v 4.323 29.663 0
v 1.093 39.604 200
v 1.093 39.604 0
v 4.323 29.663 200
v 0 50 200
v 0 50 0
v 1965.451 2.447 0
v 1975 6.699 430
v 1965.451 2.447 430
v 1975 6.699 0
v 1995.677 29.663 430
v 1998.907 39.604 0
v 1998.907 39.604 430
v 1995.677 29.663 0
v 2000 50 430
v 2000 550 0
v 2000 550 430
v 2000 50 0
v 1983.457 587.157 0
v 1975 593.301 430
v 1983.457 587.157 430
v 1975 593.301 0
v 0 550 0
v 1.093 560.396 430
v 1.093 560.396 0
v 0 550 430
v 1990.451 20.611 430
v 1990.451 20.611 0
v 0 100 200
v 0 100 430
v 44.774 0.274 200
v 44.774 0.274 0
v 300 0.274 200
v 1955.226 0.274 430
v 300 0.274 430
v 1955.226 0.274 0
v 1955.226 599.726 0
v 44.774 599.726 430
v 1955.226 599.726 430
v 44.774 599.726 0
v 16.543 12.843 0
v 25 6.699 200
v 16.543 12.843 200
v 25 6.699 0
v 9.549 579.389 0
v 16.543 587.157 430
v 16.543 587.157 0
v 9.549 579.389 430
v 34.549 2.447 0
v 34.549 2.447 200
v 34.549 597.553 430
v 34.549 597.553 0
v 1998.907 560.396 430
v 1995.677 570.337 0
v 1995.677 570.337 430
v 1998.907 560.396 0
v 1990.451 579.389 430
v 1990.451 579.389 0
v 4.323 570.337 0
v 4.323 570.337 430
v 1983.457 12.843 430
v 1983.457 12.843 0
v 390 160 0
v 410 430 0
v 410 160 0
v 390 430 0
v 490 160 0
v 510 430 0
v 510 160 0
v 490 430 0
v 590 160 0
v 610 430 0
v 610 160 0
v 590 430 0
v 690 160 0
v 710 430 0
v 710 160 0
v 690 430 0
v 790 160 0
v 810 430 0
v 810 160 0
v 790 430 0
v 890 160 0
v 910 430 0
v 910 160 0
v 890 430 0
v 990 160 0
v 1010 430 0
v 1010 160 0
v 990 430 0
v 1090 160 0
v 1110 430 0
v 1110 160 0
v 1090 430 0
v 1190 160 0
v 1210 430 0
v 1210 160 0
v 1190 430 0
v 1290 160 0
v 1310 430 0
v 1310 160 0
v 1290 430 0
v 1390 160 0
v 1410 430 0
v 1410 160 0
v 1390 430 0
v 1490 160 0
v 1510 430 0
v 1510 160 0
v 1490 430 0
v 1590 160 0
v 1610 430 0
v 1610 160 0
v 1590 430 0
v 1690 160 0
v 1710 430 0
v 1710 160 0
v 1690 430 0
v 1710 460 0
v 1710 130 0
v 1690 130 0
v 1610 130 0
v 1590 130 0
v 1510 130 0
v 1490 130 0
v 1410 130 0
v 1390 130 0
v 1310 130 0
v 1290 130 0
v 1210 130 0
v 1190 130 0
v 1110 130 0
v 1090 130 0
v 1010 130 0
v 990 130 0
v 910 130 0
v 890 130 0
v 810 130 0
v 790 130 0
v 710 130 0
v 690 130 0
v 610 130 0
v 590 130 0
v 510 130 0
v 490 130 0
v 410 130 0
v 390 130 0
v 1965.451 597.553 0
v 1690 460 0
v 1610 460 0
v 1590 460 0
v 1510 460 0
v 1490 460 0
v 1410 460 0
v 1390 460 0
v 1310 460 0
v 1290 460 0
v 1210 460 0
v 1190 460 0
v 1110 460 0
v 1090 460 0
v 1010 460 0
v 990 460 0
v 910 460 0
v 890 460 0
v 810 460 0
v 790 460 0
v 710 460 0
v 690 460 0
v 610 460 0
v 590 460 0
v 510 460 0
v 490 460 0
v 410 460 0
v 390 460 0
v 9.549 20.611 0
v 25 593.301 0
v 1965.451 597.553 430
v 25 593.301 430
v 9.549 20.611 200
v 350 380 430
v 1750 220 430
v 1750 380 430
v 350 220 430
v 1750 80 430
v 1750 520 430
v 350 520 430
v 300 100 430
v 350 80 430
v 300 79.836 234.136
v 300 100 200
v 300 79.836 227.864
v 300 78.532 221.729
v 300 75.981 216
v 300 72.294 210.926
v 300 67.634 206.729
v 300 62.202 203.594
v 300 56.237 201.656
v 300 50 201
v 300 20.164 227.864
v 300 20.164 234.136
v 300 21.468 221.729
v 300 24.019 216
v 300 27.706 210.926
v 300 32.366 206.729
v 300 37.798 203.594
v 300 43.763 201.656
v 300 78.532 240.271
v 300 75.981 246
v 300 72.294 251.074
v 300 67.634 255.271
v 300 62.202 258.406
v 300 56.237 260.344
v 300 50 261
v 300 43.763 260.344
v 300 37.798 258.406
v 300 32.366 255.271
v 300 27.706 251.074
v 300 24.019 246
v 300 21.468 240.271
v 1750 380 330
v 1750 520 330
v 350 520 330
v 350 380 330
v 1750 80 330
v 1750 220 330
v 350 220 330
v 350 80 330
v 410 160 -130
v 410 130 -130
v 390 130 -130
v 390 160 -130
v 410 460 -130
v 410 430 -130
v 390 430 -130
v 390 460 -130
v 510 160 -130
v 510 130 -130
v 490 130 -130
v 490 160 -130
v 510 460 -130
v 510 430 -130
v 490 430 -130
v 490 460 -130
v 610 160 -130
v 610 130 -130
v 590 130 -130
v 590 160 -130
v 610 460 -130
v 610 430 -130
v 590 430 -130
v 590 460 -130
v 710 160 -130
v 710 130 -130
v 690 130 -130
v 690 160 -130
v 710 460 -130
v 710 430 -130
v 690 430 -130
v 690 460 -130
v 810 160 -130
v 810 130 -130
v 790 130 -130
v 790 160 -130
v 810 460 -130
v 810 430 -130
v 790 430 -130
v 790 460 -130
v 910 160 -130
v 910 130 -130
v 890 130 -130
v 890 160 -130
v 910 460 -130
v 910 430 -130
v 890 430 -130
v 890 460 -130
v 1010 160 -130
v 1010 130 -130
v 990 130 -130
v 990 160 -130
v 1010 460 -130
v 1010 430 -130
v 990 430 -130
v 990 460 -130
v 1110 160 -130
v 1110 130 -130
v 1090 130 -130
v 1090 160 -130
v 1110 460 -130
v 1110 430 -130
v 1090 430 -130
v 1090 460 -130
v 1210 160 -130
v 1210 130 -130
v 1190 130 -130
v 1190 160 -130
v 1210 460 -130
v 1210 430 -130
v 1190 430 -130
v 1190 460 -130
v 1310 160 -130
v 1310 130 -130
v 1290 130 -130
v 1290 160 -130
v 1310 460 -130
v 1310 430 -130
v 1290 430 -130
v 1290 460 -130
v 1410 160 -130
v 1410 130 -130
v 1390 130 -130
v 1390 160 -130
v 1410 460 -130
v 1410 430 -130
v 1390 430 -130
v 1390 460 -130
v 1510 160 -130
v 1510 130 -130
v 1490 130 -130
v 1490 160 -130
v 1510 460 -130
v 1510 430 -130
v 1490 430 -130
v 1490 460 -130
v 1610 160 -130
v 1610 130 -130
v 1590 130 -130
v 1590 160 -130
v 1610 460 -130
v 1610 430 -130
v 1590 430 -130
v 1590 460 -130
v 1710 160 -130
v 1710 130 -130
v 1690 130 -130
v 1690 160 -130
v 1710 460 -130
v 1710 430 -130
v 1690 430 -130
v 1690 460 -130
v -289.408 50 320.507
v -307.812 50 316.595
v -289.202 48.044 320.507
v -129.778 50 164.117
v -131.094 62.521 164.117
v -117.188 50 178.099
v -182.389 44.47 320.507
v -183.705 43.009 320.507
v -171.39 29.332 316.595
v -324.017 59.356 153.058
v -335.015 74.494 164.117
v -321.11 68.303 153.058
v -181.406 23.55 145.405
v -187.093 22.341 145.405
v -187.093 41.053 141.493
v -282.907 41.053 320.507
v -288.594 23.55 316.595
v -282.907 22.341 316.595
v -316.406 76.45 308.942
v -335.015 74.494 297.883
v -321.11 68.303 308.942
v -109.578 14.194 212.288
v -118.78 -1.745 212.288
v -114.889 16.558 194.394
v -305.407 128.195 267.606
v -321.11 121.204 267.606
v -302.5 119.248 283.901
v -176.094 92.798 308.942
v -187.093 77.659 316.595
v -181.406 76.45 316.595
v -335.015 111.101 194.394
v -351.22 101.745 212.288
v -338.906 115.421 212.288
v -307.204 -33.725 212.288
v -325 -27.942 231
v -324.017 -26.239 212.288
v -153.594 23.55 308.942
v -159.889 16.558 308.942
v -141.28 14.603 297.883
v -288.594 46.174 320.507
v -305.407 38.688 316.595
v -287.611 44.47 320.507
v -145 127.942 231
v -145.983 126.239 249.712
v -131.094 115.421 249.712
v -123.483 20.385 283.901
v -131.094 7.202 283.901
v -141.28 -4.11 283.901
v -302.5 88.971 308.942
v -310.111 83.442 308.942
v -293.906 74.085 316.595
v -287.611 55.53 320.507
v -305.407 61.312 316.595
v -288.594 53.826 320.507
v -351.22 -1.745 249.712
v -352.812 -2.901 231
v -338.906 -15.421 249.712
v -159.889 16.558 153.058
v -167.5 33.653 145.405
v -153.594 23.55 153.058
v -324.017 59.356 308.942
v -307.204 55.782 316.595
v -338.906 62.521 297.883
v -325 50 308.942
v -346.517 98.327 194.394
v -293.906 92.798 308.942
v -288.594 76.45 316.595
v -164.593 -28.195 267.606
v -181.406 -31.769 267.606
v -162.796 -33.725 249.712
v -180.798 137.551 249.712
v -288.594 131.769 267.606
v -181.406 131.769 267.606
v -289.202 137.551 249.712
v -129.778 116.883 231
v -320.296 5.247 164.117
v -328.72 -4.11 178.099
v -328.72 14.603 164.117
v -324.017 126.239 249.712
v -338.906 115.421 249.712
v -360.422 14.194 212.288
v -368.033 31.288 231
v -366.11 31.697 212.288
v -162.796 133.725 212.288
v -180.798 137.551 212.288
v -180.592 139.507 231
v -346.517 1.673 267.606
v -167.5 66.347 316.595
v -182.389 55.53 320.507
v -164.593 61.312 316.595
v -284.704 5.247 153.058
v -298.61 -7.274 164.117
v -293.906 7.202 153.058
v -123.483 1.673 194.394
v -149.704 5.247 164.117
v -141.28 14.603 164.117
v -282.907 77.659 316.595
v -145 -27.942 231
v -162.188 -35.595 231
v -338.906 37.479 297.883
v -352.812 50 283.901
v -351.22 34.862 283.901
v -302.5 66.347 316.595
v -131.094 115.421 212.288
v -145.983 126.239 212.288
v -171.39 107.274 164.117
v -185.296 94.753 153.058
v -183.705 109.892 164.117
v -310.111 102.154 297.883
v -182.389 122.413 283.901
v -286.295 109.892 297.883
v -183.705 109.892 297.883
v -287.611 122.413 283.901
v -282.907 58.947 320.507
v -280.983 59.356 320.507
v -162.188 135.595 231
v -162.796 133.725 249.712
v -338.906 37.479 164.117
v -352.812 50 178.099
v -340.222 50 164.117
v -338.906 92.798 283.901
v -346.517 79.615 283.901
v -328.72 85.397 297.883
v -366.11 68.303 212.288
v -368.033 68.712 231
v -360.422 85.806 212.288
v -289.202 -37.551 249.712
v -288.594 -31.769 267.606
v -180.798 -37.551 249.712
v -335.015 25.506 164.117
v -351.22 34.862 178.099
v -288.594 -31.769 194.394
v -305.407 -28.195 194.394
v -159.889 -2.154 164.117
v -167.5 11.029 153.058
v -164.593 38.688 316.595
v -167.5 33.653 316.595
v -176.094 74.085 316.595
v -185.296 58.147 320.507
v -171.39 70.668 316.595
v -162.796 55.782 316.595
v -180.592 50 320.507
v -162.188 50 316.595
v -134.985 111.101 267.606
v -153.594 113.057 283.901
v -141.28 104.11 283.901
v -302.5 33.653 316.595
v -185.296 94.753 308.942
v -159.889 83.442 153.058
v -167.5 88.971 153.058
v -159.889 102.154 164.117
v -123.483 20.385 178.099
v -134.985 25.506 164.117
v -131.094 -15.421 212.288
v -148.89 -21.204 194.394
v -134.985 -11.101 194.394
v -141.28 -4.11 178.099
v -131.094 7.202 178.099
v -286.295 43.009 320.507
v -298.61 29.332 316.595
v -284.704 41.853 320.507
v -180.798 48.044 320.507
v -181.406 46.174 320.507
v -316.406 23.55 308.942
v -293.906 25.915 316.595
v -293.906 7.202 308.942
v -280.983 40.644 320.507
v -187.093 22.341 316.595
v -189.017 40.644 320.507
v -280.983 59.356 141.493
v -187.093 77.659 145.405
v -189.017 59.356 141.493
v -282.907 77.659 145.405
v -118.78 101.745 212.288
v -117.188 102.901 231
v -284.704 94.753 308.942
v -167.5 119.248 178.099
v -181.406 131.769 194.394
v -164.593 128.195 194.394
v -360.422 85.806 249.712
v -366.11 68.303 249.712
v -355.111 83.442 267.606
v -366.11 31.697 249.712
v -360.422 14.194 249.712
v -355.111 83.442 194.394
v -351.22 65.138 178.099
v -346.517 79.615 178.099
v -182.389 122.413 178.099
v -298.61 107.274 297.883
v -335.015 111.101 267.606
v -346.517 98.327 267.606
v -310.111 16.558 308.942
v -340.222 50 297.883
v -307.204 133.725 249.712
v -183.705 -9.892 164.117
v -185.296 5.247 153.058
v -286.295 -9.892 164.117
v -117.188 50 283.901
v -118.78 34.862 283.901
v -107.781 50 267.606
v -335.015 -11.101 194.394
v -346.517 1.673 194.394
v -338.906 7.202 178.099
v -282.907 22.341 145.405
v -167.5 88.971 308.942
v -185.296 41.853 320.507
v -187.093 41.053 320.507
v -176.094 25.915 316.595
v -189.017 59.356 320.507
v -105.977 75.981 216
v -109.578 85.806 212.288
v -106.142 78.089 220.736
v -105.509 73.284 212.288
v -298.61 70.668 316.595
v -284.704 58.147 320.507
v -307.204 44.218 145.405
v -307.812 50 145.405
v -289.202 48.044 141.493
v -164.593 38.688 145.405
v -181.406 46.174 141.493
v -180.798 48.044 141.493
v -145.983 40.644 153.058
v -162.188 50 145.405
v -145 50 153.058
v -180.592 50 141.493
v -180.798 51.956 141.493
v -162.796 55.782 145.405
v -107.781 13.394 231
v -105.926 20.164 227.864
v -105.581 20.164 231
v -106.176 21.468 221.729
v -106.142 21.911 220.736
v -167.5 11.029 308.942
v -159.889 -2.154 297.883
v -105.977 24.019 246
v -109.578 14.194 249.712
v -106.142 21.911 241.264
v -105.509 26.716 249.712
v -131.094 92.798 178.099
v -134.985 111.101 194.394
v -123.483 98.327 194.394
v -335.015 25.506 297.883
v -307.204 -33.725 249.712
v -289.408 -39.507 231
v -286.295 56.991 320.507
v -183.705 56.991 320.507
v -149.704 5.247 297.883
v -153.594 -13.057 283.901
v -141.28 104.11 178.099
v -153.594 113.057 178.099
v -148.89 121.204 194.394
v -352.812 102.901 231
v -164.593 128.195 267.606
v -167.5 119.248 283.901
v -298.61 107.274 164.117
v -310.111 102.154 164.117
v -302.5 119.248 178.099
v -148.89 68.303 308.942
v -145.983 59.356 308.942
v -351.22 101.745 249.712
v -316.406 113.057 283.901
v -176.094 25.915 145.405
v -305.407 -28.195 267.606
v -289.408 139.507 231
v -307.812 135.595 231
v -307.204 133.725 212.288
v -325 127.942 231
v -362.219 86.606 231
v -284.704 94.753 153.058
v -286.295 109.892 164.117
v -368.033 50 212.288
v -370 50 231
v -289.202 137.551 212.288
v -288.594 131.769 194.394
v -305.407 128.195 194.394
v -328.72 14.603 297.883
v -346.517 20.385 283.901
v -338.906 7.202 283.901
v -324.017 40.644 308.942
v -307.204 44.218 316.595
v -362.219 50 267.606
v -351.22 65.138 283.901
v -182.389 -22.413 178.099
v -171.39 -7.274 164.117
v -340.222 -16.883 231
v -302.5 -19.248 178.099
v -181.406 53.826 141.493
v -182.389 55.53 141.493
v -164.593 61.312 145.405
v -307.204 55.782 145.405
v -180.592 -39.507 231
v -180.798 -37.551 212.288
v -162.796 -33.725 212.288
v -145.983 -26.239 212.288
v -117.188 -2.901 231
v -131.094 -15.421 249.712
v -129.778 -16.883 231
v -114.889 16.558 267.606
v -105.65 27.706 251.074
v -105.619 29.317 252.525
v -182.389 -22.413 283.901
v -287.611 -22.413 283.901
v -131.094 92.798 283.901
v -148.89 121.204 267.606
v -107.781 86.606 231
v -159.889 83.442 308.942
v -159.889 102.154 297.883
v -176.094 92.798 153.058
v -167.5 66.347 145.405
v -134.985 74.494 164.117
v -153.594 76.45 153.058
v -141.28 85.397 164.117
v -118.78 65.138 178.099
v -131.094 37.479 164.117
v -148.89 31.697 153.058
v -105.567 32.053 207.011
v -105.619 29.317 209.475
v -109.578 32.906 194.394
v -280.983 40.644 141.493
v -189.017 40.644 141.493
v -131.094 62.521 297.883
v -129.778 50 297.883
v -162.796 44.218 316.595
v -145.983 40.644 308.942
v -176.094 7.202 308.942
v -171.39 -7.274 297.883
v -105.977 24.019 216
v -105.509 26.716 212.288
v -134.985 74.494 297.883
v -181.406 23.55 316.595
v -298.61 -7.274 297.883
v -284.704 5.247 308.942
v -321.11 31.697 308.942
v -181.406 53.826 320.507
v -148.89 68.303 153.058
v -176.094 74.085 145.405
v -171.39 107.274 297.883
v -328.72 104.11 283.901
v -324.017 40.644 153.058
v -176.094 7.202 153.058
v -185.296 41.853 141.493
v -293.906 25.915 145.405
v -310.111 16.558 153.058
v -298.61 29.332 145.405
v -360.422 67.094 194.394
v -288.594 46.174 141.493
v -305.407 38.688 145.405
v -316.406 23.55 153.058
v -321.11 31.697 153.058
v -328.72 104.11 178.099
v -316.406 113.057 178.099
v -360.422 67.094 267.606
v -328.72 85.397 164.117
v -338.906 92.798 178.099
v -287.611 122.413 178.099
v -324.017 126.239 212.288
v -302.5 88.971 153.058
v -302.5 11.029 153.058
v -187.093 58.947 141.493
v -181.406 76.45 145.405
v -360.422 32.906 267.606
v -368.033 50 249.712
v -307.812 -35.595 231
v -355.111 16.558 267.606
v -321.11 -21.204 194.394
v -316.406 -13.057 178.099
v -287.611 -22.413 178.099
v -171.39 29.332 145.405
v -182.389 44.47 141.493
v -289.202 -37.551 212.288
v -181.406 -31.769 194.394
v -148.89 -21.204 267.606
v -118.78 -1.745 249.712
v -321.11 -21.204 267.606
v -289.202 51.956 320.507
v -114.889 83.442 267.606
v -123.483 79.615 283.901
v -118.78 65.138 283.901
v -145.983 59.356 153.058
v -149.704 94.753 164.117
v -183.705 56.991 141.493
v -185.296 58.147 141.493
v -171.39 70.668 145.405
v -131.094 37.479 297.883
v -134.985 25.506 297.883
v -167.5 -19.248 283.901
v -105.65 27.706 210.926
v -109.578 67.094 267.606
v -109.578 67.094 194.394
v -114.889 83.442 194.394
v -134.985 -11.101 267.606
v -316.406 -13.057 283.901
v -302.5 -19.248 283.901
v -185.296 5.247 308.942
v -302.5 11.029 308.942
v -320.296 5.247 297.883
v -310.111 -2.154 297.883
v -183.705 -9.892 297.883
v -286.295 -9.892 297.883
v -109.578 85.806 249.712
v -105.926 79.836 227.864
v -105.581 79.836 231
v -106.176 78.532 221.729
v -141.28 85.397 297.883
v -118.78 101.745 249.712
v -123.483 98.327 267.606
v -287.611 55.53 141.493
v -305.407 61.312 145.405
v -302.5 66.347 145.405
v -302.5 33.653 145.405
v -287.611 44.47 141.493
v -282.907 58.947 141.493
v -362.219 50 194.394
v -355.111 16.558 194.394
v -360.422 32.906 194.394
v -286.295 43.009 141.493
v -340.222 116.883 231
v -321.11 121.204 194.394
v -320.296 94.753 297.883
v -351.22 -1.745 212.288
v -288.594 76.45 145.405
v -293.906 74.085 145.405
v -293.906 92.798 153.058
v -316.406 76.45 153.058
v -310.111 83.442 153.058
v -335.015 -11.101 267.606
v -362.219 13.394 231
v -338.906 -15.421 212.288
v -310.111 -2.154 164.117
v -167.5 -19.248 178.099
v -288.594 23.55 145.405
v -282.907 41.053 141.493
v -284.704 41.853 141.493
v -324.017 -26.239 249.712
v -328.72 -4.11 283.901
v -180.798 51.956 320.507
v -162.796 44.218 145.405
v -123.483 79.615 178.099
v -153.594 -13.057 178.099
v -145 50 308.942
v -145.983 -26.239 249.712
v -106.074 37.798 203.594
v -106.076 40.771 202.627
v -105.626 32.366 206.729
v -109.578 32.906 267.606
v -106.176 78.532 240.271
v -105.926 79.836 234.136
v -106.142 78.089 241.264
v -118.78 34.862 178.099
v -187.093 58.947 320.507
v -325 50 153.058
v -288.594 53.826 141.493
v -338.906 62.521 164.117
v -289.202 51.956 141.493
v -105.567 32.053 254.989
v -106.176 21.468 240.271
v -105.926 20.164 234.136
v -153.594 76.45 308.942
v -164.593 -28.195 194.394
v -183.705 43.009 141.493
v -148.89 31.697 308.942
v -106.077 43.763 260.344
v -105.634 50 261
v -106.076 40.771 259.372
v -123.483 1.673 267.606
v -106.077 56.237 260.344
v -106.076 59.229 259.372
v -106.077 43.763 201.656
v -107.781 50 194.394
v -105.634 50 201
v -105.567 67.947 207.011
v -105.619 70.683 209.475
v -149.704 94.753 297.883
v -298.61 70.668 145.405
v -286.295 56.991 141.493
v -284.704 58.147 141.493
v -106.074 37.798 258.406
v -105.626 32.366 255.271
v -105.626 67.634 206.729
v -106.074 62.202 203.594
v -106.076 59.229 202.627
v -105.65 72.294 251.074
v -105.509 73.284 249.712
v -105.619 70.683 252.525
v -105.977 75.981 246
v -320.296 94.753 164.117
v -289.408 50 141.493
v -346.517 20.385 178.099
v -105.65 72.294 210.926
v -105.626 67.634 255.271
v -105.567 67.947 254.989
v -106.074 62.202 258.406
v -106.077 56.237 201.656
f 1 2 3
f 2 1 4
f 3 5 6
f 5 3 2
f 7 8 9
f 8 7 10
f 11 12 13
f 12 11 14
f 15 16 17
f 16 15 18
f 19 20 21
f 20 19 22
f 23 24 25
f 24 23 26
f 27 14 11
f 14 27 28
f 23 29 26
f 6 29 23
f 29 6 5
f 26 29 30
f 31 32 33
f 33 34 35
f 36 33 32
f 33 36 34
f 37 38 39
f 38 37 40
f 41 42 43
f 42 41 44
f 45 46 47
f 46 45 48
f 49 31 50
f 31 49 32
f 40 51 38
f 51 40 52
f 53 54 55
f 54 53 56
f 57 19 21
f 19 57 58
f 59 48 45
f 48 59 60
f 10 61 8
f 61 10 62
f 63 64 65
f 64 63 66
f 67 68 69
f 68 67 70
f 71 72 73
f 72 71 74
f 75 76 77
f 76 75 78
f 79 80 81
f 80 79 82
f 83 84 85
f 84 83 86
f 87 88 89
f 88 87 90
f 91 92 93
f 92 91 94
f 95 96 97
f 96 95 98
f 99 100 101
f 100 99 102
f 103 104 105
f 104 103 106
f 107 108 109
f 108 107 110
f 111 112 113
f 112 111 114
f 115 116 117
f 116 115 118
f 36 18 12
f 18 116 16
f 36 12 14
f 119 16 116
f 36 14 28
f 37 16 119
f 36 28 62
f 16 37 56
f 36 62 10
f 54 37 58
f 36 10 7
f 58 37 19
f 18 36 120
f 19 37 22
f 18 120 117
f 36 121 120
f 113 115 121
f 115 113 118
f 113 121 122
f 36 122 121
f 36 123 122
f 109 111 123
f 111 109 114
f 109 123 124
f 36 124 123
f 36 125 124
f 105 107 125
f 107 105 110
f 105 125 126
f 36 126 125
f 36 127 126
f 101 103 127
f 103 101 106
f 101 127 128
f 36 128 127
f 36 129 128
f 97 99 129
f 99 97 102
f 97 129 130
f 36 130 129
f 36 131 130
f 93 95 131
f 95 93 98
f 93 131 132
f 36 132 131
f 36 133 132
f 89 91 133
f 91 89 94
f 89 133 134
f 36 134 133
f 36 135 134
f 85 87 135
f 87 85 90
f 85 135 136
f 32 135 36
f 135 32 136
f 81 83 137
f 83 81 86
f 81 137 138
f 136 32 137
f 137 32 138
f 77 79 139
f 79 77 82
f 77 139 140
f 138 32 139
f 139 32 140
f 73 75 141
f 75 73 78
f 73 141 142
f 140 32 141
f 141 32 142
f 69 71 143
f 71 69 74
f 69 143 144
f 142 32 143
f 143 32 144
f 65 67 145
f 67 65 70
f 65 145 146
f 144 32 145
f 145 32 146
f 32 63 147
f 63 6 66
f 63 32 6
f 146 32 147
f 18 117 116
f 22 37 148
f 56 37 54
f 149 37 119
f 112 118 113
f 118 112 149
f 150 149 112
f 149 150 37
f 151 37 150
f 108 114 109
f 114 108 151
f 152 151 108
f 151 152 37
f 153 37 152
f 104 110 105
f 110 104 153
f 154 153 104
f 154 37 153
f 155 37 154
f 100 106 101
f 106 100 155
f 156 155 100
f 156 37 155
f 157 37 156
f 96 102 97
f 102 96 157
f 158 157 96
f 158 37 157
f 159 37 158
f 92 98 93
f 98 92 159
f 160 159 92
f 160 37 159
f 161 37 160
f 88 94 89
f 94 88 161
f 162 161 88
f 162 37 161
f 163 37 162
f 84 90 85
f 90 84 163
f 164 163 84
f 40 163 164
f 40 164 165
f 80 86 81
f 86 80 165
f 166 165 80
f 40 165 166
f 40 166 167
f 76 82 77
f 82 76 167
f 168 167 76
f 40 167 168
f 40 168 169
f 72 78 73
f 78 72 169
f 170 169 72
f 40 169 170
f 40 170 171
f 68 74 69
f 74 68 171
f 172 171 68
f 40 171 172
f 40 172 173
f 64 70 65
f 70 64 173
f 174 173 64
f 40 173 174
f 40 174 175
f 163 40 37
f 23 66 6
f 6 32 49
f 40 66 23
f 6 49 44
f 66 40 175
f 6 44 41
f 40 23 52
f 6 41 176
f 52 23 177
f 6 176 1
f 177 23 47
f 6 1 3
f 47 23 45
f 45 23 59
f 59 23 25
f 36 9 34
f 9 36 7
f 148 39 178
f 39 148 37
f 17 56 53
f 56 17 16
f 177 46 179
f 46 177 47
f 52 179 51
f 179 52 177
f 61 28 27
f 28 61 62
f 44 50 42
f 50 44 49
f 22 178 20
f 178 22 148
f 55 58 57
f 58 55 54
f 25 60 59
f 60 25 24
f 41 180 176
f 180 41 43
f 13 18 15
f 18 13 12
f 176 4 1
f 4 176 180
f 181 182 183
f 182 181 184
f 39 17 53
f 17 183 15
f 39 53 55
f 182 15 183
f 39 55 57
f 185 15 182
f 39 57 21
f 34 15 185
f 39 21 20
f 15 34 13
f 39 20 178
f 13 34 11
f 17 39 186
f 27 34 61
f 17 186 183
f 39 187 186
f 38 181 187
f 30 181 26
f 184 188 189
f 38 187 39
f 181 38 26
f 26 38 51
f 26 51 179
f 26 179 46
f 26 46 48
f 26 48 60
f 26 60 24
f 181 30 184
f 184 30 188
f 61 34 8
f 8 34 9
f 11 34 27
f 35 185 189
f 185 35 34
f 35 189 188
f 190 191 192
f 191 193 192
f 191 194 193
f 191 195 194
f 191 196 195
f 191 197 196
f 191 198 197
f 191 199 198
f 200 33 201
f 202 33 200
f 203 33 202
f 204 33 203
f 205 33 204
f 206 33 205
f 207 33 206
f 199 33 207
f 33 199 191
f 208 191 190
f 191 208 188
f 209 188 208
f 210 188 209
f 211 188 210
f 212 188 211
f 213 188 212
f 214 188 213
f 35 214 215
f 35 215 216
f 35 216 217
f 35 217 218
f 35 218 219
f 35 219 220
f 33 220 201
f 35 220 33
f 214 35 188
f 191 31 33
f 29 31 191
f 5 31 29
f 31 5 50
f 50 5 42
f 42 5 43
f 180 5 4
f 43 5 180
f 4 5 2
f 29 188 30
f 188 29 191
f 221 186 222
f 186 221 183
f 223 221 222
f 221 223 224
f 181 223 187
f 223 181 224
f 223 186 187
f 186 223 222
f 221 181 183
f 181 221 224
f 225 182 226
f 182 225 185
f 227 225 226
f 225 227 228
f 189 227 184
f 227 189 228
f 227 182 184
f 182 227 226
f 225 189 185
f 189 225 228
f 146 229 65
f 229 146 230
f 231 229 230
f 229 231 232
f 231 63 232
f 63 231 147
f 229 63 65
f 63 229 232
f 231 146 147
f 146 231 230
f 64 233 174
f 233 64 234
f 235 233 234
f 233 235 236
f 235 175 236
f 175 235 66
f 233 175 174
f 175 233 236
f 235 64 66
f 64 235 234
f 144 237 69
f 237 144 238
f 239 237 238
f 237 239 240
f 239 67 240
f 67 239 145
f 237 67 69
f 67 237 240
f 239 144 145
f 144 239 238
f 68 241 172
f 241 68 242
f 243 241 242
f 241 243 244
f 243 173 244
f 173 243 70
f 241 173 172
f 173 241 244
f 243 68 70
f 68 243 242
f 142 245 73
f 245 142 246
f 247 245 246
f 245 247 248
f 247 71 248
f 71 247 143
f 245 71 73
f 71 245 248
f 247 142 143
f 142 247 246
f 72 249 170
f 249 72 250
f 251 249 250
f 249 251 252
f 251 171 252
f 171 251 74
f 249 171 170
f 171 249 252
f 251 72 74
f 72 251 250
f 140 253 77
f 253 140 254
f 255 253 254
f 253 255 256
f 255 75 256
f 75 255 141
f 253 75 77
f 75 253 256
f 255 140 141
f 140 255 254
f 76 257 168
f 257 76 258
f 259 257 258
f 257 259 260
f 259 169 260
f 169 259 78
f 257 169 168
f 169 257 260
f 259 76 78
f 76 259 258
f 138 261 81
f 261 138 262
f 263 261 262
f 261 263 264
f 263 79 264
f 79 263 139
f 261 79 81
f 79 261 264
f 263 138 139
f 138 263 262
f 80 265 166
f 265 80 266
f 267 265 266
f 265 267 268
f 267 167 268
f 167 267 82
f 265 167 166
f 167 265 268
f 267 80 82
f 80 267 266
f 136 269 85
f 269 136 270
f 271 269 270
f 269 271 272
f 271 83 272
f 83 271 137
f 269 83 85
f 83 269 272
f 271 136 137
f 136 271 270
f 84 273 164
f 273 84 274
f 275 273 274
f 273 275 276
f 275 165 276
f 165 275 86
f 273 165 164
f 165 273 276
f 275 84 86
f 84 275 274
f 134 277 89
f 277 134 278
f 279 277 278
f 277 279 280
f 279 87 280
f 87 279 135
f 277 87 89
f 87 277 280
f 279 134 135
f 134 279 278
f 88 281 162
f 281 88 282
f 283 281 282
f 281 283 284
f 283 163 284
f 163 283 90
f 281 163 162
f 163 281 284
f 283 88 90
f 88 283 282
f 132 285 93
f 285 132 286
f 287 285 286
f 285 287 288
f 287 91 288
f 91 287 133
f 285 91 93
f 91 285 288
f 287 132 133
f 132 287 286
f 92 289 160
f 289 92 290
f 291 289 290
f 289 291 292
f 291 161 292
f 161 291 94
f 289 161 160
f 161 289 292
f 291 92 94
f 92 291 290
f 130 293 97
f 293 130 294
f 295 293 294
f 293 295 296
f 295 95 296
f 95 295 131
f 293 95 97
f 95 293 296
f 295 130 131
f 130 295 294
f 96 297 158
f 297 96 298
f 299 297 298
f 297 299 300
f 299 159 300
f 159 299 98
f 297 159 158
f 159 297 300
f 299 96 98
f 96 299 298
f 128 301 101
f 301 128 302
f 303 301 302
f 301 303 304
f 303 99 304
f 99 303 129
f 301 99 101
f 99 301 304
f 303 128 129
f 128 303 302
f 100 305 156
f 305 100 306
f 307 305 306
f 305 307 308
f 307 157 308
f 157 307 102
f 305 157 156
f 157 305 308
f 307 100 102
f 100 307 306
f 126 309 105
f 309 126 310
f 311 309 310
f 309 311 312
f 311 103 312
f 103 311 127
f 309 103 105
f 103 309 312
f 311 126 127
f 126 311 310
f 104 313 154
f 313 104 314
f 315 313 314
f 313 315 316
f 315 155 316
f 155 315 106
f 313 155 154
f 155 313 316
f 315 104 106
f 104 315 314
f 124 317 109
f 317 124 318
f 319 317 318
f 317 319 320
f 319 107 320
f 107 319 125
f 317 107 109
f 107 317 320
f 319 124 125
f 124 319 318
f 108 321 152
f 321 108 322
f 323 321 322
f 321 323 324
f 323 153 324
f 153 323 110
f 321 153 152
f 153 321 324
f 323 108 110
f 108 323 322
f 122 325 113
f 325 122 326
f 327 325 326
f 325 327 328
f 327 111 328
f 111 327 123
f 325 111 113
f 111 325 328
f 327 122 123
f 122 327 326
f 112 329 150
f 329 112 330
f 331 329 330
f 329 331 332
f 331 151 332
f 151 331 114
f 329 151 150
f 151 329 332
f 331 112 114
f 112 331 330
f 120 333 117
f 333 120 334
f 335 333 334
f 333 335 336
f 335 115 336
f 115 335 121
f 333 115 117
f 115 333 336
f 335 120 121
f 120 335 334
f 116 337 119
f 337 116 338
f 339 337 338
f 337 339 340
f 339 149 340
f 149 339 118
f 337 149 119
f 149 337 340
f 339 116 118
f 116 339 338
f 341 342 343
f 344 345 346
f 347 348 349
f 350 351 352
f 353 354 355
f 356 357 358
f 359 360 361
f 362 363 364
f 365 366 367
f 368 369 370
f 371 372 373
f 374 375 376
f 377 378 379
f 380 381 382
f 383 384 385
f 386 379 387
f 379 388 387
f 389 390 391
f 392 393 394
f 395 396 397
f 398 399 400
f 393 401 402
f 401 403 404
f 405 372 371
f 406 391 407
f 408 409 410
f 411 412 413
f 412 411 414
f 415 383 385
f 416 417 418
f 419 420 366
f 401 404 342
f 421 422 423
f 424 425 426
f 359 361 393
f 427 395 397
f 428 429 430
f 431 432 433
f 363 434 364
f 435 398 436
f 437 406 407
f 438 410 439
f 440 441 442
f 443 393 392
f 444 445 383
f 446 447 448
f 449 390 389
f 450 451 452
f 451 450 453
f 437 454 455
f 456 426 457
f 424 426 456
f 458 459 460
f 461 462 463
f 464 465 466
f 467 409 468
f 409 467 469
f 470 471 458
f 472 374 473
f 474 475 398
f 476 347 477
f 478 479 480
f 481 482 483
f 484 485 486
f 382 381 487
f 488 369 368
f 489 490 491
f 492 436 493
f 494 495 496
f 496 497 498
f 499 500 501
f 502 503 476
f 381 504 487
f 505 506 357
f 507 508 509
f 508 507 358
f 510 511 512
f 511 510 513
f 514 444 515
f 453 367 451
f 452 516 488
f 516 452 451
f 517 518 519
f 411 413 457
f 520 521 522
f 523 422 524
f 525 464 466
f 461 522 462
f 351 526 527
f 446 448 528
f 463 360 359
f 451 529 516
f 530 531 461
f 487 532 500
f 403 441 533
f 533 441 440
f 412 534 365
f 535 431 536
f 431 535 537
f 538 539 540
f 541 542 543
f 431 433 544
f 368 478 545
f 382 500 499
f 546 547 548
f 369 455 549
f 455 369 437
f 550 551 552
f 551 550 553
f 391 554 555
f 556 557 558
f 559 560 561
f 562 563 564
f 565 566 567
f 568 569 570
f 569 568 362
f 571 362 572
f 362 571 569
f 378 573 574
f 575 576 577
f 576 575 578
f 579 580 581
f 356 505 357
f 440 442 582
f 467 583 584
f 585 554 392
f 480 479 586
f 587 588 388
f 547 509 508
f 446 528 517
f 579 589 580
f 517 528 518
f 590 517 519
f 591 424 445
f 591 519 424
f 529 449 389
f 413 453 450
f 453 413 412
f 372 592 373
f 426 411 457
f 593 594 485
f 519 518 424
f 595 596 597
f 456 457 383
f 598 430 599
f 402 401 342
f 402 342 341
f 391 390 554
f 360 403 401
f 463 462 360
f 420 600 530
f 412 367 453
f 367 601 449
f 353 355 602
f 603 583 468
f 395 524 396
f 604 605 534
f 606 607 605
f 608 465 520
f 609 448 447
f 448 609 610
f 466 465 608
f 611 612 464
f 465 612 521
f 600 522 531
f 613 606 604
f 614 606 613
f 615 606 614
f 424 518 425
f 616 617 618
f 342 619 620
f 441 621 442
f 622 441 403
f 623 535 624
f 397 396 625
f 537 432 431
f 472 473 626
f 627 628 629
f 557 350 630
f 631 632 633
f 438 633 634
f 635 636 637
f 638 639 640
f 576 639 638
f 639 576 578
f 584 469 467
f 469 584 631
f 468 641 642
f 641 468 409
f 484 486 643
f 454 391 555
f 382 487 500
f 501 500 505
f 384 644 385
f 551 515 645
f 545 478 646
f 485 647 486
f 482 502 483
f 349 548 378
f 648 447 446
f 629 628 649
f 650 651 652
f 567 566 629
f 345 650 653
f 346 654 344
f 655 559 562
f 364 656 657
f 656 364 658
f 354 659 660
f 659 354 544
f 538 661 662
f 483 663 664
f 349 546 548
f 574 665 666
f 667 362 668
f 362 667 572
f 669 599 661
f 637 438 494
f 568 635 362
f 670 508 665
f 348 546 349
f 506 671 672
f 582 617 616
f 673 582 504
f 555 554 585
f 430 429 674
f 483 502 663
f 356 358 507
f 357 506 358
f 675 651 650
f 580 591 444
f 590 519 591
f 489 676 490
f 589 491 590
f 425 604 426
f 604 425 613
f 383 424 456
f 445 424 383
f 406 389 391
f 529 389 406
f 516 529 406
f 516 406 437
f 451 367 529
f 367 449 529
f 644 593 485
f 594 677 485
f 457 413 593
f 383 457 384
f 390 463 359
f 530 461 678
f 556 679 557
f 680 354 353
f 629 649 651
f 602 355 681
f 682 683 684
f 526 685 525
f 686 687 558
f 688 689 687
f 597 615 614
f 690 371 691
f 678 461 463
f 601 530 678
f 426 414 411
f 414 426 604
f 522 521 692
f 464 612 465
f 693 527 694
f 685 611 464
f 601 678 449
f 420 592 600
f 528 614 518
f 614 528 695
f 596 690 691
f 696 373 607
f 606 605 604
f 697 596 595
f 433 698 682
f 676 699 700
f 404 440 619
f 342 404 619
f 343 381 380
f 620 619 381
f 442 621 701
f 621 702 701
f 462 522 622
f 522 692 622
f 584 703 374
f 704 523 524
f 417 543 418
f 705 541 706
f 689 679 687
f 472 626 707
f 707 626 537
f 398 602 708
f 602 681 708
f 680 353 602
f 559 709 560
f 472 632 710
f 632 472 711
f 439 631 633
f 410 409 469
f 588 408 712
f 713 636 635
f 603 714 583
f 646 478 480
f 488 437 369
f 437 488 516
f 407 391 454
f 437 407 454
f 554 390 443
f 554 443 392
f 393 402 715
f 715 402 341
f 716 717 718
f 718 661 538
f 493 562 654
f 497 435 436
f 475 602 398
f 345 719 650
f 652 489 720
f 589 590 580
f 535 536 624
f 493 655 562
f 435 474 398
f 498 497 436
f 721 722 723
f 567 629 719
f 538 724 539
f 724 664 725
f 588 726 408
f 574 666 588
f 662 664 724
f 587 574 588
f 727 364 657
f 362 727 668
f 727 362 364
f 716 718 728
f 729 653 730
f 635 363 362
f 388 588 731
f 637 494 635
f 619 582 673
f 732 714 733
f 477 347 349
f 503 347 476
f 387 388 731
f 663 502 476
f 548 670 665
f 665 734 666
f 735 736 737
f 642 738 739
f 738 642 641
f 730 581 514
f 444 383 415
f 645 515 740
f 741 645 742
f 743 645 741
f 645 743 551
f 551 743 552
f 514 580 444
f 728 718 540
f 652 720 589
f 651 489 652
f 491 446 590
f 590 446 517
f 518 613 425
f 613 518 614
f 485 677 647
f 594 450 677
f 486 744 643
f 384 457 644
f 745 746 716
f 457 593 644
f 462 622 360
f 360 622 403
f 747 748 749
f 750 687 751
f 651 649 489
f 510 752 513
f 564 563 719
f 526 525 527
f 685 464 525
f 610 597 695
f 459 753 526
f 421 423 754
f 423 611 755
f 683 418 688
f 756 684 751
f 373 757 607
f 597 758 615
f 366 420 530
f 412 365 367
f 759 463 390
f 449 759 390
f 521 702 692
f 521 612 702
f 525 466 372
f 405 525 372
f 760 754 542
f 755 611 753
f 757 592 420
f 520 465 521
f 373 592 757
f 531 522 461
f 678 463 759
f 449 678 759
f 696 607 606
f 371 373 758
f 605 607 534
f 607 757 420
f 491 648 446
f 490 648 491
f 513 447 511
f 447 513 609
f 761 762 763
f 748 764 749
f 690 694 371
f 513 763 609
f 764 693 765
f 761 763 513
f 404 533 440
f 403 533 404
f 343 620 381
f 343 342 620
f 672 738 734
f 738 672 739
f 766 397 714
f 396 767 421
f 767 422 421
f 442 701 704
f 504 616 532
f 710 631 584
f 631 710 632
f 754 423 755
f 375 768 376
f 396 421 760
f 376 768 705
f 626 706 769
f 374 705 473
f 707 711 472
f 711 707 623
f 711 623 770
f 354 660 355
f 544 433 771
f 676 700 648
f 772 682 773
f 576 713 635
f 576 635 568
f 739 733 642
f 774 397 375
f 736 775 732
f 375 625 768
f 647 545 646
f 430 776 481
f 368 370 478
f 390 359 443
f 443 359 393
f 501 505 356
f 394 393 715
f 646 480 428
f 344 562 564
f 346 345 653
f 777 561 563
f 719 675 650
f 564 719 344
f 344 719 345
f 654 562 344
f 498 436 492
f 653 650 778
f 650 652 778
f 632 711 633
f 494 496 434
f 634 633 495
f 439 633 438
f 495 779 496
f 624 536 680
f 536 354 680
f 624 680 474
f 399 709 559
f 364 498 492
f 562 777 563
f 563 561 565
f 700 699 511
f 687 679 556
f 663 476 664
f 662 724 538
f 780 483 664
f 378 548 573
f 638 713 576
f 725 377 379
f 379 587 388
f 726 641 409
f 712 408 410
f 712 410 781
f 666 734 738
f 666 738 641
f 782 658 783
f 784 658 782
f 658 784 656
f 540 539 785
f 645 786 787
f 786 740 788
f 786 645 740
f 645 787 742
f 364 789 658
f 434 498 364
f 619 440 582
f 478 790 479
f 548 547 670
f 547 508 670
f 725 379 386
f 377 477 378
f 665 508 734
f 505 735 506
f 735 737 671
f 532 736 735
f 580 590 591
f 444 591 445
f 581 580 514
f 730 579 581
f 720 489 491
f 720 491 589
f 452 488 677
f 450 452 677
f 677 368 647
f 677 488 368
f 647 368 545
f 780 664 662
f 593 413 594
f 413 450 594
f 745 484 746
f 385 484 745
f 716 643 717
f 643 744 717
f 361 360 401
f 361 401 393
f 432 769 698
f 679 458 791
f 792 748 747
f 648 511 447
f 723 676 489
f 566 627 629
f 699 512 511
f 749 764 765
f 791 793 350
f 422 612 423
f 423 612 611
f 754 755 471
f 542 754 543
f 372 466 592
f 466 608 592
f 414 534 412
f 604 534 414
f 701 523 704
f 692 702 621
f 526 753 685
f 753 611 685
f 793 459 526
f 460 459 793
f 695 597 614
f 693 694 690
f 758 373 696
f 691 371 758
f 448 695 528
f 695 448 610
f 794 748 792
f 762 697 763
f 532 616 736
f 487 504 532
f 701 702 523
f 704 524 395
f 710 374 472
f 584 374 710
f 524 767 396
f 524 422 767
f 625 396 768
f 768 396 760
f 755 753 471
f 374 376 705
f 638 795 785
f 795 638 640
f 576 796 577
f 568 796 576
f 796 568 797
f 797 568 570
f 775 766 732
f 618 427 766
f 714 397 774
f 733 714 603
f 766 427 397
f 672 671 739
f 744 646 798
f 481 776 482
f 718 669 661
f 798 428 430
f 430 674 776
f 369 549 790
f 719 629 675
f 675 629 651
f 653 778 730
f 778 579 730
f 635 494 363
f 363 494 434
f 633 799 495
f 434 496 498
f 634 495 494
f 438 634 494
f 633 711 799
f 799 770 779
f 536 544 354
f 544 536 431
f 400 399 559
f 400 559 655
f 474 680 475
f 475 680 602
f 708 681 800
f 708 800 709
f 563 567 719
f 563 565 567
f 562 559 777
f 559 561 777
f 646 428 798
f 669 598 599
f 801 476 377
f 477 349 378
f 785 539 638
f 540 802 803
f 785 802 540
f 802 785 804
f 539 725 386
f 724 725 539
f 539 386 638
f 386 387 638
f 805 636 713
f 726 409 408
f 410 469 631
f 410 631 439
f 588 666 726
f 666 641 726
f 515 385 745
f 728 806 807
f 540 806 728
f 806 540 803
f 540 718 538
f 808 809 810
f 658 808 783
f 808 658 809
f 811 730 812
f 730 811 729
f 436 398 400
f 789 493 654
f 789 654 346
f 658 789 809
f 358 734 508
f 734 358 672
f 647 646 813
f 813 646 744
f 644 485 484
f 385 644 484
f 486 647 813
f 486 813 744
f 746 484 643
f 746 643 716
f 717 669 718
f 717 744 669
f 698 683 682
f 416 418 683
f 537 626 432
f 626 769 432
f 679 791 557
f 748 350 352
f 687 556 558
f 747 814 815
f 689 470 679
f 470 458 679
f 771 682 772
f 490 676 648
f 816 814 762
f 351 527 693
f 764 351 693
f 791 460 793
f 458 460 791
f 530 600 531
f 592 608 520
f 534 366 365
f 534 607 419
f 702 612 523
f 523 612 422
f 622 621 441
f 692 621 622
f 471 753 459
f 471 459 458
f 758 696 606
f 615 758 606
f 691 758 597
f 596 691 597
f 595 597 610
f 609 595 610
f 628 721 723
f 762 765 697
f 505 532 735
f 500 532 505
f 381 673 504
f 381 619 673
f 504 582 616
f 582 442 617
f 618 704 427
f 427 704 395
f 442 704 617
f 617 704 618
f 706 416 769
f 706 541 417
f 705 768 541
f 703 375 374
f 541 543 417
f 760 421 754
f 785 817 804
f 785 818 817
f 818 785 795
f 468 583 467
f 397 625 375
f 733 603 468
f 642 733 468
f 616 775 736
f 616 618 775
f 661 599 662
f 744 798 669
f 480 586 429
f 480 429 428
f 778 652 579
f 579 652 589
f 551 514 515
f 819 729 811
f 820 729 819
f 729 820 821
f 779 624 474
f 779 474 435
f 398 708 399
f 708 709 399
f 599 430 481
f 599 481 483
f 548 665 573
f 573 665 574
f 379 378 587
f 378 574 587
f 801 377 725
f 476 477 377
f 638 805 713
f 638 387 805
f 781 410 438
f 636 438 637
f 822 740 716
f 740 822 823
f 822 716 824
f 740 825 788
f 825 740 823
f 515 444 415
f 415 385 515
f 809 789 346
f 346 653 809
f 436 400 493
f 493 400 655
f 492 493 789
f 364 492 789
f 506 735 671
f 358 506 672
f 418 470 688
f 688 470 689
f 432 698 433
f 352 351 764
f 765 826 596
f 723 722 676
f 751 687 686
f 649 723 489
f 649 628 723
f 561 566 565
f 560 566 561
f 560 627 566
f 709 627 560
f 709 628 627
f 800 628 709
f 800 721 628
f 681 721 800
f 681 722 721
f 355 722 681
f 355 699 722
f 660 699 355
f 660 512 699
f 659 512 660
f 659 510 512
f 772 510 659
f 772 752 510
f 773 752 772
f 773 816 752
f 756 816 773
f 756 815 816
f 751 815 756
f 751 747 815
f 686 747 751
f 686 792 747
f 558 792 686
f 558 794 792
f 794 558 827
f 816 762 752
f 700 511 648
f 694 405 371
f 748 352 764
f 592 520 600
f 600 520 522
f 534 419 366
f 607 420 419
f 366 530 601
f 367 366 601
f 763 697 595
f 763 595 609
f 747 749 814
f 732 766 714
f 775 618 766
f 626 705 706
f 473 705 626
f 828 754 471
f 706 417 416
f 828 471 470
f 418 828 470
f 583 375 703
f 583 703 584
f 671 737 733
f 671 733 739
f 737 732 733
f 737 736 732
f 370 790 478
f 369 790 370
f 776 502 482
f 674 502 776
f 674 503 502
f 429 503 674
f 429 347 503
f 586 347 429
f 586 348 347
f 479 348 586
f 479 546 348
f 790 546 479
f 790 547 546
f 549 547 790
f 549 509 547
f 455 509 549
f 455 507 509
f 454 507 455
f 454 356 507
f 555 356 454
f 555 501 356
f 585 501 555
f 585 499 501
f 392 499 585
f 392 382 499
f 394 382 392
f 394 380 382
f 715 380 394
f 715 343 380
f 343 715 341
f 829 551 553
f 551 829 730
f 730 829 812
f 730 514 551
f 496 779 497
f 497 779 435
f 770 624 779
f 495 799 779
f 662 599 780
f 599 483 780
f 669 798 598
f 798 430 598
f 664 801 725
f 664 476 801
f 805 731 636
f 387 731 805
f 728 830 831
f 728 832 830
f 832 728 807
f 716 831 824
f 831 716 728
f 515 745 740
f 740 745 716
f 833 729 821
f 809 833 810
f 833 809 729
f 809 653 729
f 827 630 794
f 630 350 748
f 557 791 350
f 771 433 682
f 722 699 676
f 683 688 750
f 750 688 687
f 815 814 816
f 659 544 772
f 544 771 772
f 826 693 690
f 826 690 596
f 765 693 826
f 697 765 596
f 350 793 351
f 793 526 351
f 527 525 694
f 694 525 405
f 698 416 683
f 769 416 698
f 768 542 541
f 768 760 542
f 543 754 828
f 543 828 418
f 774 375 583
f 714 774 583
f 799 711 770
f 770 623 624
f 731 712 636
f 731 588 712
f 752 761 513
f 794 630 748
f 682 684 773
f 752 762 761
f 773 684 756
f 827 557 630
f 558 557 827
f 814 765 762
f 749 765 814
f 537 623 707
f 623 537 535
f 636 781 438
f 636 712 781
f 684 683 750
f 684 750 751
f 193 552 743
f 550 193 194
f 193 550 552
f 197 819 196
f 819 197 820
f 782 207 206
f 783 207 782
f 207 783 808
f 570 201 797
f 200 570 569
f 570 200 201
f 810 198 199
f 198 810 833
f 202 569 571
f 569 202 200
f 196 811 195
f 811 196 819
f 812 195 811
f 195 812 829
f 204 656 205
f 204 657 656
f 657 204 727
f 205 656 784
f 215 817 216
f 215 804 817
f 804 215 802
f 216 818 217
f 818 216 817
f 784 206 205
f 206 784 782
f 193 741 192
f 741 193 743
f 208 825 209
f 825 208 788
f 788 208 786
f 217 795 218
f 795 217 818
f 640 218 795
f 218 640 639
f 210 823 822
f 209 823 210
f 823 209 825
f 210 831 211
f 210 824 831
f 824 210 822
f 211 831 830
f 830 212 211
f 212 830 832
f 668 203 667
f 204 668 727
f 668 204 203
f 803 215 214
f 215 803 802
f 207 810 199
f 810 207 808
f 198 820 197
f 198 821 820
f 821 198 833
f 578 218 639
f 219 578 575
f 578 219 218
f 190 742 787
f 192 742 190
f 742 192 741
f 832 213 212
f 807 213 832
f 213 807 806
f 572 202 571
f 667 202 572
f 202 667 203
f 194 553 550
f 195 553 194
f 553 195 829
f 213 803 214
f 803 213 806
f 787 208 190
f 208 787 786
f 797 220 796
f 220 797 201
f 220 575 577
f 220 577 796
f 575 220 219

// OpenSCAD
// all dimensions are in mil (0.001in)

corner_radius = 50;
height = 430;
length = 2000;
width = 600;
pin_pitch = 100;
pin_spacing = 300;
zif_slot_spacing = 160;
zif_slot_width = 140;
zif_slot_length = 1400;
zif_slot_depth = 100;
lever_metal_length = 400;
lever_metal_radius = 30;
lever_handle_length = 270;
lever_handle_radius = 180 / 2;
lever_handle_bottom_spacing = 1;
lever_indent_width = 100;
lever_indent_length = 300;
lever_indent_height = height - 200;
lever_metal_protrusion = lever_metal_length - lever_indent_length;
body_color = [1, 0.40, 0.25];
lever_metal_color = [0.75, 0.75, 0.75];
copper_color = [0.75, 0.75, 0.65];
pin_length = 130;
pin_width = 30;
pin_breadth = 20;

module body() {

    linear_extrude(height=height)
    hull()
    {
        translate(
	        [
                corner_radius,
                corner_radius,
                0
	        ]
        )
        circle(r=corner_radius);

        translate(
	        [
                corner_radius,
                width - corner_radius,
                0
	        ]
        )
        circle(r=corner_radius);

        translate(
	        [
                length - corner_radius,
                corner_radius,
                0
	        ]
        )
        circle(r=corner_radius);

        translate(
	        [
                length - corner_radius,
                width - corner_radius,
                0
	        ]
        )
        circle(r=corner_radius);
    }

}

module lever_handle() {
    hull()
    {
        translate(
            [
                lever_handle_radius,
                lever_handle_radius,
                lever_handle_radius
            ]
        )
        sphere(r=lever_handle_radius);
        translate(
            [
                lever_handle_length - lever_handle_radius,
                lever_handle_radius,
                lever_handle_radius
            ]
        )
        sphere(r=lever_handle_radius);
    }
}

module pins() {
    for (i = [0 : 13]) {
        translate([i * pin_pitch, 0, 0])
        cube([pin_breadth, pin_width, pin_length * 2]);
        translate([i * pin_pitch, pin_spacing, 0])
        cube([pin_breadth, pin_width, pin_length * 2]);
    }
}

color(body_color) difference() {
    body();
    translate(
        [-corner_radius, -corner_radius, height - lever_indent_height]
    )
    cube([lever_indent_length + corner_radius, lever_indent_width + corner_radius, height]);

    translate(
        [350, (width / 2) + (zif_slot_spacing / 2), height - zif_slot_depth]
    )
    cube([zif_slot_length, zif_slot_width, height]);

    translate(
        [350, (width / 2) - (zif_slot_spacing / 2) - zif_slot_width, height - zif_slot_depth]
    )
    cube([zif_slot_length, zif_slot_width, height]);
}

translate([-lever_handle_length - lever_metal_protrusion, -lever_handle_radius + lever_metal_radius + (lever_indent_width - (lever_metal_radius*2)) / 2, -lever_handle_radius + lever_metal_radius + lever_handle_bottom_spacing + (height - lever_indent_height)])
color(body_color) lever_handle();

color(lever_metal_color)
translate([-lever_metal_protrusion - lever_handle_radius, lever_metal_radius + (lever_indent_width - (lever_metal_radius*2)) / 2, lever_metal_radius + lever_handle_bottom_spacing + (height - lever_indent_height)])
rotate(a=[0, 90, 0])
cylinder(r=lever_metal_radius, h=lever_metal_length + lever_handle_radius*2);

color(copper_color)
translate([390, 130, -pin_length])
pins();
